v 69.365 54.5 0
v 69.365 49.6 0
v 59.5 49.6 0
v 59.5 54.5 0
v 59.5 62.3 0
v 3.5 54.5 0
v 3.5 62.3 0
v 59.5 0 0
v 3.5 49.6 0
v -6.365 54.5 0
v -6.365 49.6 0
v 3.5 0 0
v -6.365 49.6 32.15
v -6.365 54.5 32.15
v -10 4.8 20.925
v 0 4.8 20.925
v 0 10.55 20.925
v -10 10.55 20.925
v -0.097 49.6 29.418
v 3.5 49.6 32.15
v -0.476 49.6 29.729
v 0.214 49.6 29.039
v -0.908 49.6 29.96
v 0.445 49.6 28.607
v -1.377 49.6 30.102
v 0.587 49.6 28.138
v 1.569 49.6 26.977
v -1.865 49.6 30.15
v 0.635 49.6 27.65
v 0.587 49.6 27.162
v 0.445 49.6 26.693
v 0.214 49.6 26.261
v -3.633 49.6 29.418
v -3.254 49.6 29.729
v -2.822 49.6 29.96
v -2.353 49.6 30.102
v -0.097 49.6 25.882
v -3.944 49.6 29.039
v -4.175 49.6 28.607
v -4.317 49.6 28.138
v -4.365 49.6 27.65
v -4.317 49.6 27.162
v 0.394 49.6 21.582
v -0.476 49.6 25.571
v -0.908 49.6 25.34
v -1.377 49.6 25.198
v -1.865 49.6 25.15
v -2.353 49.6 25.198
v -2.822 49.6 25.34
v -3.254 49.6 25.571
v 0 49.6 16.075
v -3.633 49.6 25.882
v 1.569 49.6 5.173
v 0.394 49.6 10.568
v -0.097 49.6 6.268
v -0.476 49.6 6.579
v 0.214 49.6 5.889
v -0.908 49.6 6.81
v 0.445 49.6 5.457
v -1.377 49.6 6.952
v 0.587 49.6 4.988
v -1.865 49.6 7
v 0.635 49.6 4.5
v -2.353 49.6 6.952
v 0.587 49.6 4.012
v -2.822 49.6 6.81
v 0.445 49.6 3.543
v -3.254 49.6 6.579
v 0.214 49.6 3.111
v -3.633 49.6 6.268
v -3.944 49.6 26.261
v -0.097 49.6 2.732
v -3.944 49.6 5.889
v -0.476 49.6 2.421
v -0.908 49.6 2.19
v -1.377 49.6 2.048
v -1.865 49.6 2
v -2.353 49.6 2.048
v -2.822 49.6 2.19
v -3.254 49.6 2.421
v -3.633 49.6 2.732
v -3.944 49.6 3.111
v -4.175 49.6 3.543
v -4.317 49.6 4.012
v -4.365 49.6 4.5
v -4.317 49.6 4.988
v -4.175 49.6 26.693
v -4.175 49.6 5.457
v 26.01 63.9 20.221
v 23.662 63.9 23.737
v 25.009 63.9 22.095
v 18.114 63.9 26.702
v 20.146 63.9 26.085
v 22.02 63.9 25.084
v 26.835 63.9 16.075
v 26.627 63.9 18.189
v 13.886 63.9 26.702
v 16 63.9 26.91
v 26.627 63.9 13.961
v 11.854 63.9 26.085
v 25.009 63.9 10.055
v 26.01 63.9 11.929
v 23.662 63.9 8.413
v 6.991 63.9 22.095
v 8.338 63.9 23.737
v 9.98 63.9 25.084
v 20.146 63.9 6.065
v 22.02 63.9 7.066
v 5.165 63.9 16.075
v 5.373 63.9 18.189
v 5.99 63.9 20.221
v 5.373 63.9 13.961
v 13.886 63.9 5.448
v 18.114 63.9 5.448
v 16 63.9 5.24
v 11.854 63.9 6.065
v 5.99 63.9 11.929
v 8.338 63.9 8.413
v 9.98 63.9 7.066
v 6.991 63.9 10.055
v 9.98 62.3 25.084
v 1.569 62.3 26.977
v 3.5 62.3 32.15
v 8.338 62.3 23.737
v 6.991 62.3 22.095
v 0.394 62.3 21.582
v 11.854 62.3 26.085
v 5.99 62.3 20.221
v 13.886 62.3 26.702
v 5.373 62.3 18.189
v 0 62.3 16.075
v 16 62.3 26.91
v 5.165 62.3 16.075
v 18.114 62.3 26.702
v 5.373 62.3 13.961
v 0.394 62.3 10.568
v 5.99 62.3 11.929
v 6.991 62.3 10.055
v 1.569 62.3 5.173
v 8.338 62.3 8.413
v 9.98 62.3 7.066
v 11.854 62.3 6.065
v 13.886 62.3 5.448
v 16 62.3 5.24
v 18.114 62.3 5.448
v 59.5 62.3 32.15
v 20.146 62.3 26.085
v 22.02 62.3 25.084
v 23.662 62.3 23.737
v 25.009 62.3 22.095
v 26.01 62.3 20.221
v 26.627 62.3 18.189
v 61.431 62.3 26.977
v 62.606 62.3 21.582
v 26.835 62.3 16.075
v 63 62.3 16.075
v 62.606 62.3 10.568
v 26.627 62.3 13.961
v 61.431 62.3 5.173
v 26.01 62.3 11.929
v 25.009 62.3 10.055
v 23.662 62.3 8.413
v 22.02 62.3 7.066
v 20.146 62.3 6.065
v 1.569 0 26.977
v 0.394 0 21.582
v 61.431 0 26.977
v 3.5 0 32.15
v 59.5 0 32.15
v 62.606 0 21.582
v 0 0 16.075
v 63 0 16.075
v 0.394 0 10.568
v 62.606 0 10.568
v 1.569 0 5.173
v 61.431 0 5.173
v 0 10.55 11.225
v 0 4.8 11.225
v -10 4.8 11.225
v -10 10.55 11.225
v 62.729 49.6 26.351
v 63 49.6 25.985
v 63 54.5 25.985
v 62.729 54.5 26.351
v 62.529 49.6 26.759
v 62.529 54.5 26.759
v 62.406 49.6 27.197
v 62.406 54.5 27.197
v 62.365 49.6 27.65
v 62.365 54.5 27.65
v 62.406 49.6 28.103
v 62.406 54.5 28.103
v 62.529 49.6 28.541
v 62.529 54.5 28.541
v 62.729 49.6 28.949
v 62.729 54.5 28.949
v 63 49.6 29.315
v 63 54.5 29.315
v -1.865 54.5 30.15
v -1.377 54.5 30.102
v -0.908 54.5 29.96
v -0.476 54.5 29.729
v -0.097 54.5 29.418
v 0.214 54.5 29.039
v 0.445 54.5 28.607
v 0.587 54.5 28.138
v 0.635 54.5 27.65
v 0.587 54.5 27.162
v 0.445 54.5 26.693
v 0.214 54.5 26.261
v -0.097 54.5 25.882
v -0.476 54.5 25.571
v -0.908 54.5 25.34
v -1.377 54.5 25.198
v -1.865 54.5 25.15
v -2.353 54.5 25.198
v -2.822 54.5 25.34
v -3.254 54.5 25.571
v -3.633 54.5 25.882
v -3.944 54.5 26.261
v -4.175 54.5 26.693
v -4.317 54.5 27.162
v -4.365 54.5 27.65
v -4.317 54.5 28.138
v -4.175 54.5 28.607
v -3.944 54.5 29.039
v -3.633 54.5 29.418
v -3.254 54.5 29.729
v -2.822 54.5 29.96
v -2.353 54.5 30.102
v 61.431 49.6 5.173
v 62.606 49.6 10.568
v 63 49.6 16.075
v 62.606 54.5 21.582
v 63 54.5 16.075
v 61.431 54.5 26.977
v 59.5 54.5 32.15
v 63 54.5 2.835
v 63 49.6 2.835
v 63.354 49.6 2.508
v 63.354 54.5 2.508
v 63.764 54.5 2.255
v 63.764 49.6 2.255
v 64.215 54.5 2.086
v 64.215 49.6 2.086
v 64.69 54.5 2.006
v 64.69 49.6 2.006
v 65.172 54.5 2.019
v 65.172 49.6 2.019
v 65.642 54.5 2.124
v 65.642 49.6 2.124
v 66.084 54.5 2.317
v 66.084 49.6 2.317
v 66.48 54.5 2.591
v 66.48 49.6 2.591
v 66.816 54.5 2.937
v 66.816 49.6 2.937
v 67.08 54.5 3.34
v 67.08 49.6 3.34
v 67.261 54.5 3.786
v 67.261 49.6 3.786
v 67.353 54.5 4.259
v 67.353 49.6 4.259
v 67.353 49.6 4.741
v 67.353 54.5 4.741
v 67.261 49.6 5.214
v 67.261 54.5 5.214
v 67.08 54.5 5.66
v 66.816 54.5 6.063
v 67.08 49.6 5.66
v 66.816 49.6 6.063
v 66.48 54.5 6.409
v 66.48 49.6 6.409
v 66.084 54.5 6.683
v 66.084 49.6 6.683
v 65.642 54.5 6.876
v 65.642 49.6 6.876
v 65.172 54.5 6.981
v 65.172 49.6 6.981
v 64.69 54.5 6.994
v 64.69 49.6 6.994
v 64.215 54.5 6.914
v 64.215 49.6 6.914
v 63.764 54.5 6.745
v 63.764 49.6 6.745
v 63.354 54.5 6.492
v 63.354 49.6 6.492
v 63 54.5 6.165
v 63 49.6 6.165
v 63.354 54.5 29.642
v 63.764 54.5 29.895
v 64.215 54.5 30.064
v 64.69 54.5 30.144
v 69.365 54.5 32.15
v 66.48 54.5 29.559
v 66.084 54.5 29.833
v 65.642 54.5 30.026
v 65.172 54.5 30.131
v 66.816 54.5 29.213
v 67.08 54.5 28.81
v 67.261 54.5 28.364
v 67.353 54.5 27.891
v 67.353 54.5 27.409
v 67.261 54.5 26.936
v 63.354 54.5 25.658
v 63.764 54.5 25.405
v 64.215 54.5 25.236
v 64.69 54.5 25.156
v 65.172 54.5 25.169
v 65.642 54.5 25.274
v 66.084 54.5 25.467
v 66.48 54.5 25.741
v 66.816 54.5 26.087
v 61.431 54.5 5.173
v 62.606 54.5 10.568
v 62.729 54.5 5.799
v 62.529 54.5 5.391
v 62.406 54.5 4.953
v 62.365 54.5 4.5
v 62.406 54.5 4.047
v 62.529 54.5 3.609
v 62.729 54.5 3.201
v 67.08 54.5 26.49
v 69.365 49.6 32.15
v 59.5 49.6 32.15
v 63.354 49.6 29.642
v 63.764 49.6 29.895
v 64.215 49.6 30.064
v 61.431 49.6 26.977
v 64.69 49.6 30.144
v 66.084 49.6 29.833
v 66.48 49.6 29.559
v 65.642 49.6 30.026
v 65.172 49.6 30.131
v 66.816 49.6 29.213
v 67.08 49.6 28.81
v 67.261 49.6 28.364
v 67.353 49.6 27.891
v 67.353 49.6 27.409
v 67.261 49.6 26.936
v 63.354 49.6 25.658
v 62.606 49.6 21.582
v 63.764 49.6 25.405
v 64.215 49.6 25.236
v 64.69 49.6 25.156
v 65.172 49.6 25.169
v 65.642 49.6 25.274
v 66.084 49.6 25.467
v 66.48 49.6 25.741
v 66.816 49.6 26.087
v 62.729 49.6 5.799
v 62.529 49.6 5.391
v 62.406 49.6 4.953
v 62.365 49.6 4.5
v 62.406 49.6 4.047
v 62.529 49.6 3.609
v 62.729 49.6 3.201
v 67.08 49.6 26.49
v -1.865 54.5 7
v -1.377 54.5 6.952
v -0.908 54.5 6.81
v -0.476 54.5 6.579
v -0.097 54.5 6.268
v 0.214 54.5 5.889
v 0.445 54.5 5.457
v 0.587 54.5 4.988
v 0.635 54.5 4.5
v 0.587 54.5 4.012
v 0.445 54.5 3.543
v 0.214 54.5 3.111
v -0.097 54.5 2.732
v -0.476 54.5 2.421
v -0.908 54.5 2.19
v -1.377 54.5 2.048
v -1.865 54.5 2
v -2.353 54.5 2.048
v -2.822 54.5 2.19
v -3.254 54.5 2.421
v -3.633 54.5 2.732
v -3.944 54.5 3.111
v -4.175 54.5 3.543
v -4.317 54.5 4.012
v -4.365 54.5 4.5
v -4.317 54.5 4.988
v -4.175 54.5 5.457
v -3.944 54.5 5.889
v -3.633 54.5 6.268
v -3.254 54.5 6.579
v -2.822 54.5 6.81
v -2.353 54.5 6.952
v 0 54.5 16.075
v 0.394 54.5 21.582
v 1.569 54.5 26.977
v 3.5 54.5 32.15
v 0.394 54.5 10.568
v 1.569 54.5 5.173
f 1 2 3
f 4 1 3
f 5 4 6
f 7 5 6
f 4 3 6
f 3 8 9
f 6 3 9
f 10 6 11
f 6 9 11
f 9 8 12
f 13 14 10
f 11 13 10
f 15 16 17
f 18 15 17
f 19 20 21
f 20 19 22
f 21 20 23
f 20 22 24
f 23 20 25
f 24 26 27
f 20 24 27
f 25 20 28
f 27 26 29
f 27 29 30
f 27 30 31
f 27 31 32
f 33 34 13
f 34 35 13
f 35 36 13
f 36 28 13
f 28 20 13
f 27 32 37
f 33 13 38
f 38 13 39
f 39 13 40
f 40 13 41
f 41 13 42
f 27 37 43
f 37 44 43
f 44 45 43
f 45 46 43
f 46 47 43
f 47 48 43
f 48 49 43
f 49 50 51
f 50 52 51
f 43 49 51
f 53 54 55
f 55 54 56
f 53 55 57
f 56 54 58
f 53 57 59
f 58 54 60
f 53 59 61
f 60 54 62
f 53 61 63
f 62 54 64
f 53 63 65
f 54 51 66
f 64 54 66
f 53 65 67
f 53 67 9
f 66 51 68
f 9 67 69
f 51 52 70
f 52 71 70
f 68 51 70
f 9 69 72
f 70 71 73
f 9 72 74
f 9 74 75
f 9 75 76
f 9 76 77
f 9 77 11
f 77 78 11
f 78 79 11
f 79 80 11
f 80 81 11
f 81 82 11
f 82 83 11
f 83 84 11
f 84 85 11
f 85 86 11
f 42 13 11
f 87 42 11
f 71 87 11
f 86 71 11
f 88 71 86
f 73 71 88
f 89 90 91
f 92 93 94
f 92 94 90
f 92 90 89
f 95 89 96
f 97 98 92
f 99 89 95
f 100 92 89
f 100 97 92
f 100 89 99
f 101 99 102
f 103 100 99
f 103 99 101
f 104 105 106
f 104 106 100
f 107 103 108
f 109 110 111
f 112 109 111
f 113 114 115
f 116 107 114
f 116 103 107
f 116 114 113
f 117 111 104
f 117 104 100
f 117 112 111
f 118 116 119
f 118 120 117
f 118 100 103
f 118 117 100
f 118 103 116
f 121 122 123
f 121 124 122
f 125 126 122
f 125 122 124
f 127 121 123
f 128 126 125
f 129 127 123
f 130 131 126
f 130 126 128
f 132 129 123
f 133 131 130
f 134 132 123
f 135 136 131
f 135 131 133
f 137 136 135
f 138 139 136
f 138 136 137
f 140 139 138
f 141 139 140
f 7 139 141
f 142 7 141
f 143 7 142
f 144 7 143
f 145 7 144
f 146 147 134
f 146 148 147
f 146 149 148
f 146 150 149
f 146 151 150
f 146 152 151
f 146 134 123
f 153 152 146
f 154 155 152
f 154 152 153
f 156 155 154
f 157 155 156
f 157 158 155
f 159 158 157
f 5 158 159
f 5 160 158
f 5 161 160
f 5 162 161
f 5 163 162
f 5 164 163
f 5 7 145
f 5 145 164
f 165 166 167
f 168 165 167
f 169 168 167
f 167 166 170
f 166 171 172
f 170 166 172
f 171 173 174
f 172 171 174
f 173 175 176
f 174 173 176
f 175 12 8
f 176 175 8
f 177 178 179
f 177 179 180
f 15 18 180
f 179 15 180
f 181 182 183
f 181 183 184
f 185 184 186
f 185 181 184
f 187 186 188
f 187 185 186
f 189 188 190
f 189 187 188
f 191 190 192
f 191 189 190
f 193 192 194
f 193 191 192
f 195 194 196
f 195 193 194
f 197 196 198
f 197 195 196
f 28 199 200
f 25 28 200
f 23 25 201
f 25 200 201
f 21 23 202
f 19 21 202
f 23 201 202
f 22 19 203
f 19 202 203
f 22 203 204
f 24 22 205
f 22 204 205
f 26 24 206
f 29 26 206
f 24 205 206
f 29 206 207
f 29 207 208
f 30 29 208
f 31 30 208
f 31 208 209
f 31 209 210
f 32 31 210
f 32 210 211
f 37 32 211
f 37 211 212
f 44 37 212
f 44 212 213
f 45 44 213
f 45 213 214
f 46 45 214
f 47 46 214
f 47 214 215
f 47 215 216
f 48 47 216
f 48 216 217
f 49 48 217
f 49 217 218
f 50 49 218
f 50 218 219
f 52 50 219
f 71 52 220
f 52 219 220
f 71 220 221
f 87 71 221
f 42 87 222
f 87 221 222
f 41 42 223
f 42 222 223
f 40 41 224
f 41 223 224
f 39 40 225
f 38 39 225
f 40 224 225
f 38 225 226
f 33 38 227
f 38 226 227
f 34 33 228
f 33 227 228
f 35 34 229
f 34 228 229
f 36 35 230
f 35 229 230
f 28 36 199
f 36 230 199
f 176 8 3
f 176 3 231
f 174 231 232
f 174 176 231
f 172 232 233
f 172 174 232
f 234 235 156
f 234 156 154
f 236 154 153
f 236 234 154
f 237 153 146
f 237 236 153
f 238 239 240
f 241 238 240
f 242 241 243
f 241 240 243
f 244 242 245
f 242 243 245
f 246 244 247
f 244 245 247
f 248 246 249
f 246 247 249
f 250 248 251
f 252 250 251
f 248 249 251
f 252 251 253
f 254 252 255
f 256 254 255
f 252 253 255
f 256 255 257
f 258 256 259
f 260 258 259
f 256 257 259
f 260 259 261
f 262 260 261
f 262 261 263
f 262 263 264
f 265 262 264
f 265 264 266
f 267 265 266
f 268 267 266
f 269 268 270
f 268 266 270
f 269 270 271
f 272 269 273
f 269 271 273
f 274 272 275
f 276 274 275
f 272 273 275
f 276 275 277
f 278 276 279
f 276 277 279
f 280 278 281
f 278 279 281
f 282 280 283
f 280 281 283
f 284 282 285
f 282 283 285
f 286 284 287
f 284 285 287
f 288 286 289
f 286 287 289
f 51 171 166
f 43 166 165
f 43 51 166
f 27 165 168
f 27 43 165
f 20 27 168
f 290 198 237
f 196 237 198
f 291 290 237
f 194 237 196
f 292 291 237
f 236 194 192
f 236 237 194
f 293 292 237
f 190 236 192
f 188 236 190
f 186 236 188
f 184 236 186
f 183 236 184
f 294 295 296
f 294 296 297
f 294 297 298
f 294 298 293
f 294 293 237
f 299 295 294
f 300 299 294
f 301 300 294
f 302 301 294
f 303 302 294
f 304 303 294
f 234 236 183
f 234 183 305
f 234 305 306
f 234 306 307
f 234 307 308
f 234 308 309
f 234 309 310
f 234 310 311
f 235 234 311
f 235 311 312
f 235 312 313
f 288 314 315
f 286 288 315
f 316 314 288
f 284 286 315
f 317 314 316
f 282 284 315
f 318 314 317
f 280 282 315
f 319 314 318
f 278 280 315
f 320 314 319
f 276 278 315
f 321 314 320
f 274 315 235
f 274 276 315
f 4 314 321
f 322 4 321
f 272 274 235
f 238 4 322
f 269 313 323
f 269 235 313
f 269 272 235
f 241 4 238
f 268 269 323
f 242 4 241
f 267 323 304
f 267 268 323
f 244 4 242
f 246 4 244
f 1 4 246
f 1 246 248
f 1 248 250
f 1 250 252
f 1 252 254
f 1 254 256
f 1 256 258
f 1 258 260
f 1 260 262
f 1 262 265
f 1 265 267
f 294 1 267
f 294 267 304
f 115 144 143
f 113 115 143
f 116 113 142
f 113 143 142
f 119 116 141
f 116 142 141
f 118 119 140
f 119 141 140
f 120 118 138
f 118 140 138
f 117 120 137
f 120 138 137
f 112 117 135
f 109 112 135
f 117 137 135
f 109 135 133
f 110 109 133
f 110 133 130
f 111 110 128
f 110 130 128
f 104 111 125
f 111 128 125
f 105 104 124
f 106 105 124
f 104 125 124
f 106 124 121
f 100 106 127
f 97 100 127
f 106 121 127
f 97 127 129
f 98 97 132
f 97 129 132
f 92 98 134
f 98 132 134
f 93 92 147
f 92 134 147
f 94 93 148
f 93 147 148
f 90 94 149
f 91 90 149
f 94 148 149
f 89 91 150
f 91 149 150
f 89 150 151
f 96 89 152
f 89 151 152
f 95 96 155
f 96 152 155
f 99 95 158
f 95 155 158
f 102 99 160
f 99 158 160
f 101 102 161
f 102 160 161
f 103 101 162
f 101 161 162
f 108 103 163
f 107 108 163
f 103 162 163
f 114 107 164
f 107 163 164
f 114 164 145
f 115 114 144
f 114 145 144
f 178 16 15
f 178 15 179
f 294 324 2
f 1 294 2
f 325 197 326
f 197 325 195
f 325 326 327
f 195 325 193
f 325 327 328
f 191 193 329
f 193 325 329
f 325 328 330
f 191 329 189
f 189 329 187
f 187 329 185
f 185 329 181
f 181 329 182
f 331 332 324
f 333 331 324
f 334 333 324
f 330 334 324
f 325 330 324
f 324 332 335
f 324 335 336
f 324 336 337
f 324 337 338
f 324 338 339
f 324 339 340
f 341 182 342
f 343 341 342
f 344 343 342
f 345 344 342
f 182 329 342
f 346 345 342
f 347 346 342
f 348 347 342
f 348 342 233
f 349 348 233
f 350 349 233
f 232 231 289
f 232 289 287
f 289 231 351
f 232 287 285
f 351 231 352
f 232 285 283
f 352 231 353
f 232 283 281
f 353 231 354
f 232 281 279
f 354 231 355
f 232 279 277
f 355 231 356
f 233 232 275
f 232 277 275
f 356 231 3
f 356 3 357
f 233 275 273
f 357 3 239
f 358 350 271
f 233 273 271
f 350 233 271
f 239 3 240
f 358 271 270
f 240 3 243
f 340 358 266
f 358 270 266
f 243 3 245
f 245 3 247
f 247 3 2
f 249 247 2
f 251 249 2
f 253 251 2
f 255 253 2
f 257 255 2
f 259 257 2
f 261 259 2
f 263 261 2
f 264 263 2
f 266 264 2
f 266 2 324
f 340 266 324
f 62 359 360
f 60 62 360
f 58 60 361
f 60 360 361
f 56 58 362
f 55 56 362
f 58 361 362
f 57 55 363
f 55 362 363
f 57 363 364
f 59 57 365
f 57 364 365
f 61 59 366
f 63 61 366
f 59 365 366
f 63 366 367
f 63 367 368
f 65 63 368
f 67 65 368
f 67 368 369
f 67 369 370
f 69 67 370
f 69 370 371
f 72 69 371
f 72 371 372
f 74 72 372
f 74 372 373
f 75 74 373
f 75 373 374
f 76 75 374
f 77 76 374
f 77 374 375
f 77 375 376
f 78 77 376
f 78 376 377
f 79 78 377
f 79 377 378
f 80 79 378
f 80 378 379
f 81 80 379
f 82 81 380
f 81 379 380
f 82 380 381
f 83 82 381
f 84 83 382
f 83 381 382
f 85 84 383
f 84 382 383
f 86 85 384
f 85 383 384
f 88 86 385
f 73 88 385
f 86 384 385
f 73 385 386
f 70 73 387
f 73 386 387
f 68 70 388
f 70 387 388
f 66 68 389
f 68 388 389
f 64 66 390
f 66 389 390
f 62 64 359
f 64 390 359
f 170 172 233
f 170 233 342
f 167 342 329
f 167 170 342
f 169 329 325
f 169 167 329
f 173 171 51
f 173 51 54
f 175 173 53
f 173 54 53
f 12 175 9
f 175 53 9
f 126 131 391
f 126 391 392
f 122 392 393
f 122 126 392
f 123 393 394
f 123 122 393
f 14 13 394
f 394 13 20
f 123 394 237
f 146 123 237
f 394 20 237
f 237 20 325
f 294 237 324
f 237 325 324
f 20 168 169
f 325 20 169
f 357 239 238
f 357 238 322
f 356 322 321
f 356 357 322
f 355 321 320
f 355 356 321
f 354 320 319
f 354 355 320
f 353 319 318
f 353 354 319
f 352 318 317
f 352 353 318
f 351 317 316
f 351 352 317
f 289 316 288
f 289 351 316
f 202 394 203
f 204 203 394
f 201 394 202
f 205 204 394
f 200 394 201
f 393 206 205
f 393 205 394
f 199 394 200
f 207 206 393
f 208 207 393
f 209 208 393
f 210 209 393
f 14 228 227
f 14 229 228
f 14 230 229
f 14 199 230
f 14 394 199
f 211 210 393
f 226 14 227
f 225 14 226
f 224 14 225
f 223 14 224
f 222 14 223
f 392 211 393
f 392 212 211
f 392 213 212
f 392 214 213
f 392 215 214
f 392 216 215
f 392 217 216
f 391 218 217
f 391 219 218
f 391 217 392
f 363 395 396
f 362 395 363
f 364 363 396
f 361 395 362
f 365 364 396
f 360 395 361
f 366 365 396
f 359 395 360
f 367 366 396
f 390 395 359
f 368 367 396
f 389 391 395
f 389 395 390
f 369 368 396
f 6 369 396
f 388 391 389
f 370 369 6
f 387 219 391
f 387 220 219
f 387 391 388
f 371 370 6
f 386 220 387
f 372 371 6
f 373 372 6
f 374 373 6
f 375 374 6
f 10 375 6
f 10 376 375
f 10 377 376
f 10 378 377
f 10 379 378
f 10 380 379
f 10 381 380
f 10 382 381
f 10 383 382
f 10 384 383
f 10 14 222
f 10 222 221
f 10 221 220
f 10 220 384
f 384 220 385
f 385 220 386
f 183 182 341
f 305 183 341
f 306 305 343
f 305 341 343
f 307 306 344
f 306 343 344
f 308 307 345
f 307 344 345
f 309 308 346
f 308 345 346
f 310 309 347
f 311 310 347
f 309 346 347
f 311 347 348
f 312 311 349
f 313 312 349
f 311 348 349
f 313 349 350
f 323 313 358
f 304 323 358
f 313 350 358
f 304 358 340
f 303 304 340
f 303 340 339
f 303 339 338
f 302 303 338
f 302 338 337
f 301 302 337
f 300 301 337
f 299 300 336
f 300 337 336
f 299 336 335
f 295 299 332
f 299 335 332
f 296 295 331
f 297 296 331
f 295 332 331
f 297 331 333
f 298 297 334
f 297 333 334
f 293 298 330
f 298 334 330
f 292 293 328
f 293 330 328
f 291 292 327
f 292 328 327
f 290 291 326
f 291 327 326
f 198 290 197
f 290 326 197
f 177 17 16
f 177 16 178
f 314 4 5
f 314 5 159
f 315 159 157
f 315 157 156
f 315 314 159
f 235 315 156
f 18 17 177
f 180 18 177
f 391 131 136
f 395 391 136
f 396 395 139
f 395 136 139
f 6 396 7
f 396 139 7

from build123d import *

# Parameters (mm, degrees)
SKETCH1_W           = 63
SKETCH1_H           = 62.3
BOSS_EXTRUDE1_DEPTH = 32.15
SKETCH4_R           = 10.835
BOSS_EXTRUDE3_DEPTH = 1.6
CUT_EXTRUDE1_DEPTH  = 95.254509176
BOSS_EXTRUDE4_START = -6.365
SKETCH3_W           = 32.15
SKETCH3_H           = 4.9
BOSS_EXTRUDE4_DEPTH = 16.365
SKETCH6_R           = 2.5
CUT_EXTRUDE2_DEPTH  = 90.29094299
MIRROR2_DEPTH       = 49.6
MIRROR2_START       = 54.5
MIRROR2_2_DEPTH     = 7.8
MIRROR2_START_2     = 49.6
MIRROR2_3_DEPTH     = 4.9
MIRROR2_4_DEPTH     = 4.9
SKETCH5_W           = 9.7
SKETCH5_H           = 5.75
BOSS_EXTRUDE5_DEPTH = 10


# Read off the part's stored shape, not the designer's step: Mirror2
with BuildPart() as part:
    # Sketch1 → Boss-Extrude1 (new body)
    with BuildSketch(Plane.XY):
        with Locations((31.5, 31.15)):
            Rectangle(SKETCH1_W, SKETCH1_H)
    extrude(amount=BOSS_EXTRUDE1_DEPTH)

    # Sketch4 → Boss-Extrude3 (add)
    with BuildSketch(Plane(origin=(0, 62.3, 0), x_dir=(1, 0, 0), z_dir=(0, 1, 0))):
        with Locations(Location((16, -16.075, 0), (0, 0, 90))):
            Circle(SKETCH4_R)
    extrude(amount=BOSS_EXTRUDE3_DEPTH)

    # Sketch7 → Cut-Extrude1 (cut, through all)
    with BuildSketch(Plane(origin=(0, 62.3, 0), x_dir=(1, 0, 0), z_dir=(0, 1, 0))):
        with BuildLine():
            Line((3.5, 0), (0, 0))
            Line((0, 0), (0, -16.075))
            ThreePointArc((0, -16.075), (0.885131329, -7.849192669), (3.5, 0))
        make_face()
    cut_extrude1 = extrude(amount=-CUT_EXTRUDE1_DEPTH, mode=Mode.SUBTRACT)

    # Mirror1: Cut-Extrude1 across plane
    add(cut_extrude1.mirror(Plane.XY.offset(16.075)), mode=Mode.SUBTRACT)

    # Sketch3 → Boss-Extrude4 (add)
    with BuildSketch(Plane(origin=(0, 0, 0), x_dir=(0, 0, -1), z_dir=(1, 0, 0)).offset(BOSS_EXTRUDE4_START)):
        with Locations((-16.075, 52.05)):
            Rectangle(SKETCH3_W, SKETCH3_H)
    extrude(amount=BOSS_EXTRUDE4_DEPTH)

    # Sketch6 → Cut-Extrude2 (cut, through all)
    with BuildSketch(Plane(origin=(0, 54.5, 0), x_dir=(1, 0, 0), z_dir=(0, 1, 0))):
        with Locations(Location((-1.865, -4.5, 0), (0, 0, 270))):
            Circle(SKETCH6_R)
        with Locations(Location((-1.865, -27.65, 0), (0, 0, 270))):
            Circle(SKETCH6_R)
    extrude(amount=-CUT_EXTRUDE2_DEPTH, mode=Mode.SUBTRACT)

    # Mirror2 outline → Mirror2 (cut)
    with BuildSketch(Plane(origin=(0, 0, 0), x_dir=(1, 0, 0), z_dir=(0, 1, 0))):
        with BuildLine():
            ThreePointArc((63, -16.075), (62.114868671, -24.300807331), (59.5, -32.15))
            Line((59.5, -32.15), (63, -32.15))
            Line((63, -32.15), (63, -16.075))
        make_face()
        with BuildLine():
            ThreePointArc((59.5, 0), (62.114868671, -7.849192669), (63, -16.075))
            Line((63, -16.075), (63, 0))
            Line((63, 0), (59.5, 0))
        make_face()
    extrude(amount=MIRROR2_DEPTH, mode=Mode.SUBTRACT)

    # Mirror2 2 outline → Mirror2 2 (cut)
    with BuildSketch(Plane(origin=(0, 0, 0), x_dir=(1, 0, 0), z_dir=(0, 1, 0)).offset(MIRROR2_START)):
        with BuildLine():
            ThreePointArc((63, -16.075), (62.114868671, -24.300807331), (59.5, -32.15))
            Line((59.5, -32.15), (63, -32.15))
            Line((63, -32.15), (63, -16.075))
        make_face()
        with BuildLine():
            ThreePointArc((59.5, 0), (62.114868671, -7.849192669), (63, -16.075))
            Line((63, -16.075), (63, 0))
            Line((63, 0), (59.5, 0))
        make_face()
    extrude(amount=MIRROR2_2_DEPTH, mode=Mode.SUBTRACT)

    # Mirror2 3 outline → Mirror2 3 (cut)
    with BuildSketch(Plane(origin=(0, 0, 0), x_dir=(1, 0, 0), z_dir=(0, 1, 0)).offset(MIRROR2_START_2)):
        with BuildLine():
            ThreePointArc((63, -2.835135141), (62.365, -4.5), (63, -6.164864859))
            Line((63, -6.164864859), (63, -2.835135141))
        make_face()
        with BuildLine():
            Line((63, -29.314864859), (63, -25.985135141))
            ThreePointArc((63, -25.985135141), (62.365, -27.65), (63, -29.314864859))
        make_face()
    extrude(amount=MIRROR2_3_DEPTH, mode=Mode.SUBTRACT)

    # Mirror2 4 outline → Mirror2 4 (add)
    with BuildSketch(Plane(origin=(0, 0, 0), x_dir=(1, 0, 0), z_dir=(0, 1, 0)).offset(MIRROR2_START_2)):
        with BuildLine():
            Line((63, -6.164864859), (63, -25.985135141))
            ThreePointArc((63, -25.985135141), (67.365, -27.65), (63, -29.314864859))
            Line((63, -29.314864859), (63, -32.15))
            Line((63, -32.15), (69.365, -32.15))
            Line((69.365, -32.15), (69.365, 0))
            Line((69.365, 0), (63, 0))
            Line((63, 0), (63, -2.835135141))
            ThreePointArc((63, -2.835135141), (67.365, -4.5), (63, -6.164864859))
        make_face()
    extrude(amount=MIRROR2_4_DEPTH)


with BuildPart() as body_2:
    # Sketch5 → Boss-Extrude5 (new body)
    with BuildSketch(Plane(origin=(0, 0, 0), x_dir=(0, 0, -1), z_dir=(1, 0, 0))):
        with Locations((-16.075, 7.675)):
            Rectangle(SKETCH5_W, SKETCH5_H)
    extrude(amount=-BOSS_EXTRUDE5_DEPTH)


solid = Compound([part.part, body_2.part])
